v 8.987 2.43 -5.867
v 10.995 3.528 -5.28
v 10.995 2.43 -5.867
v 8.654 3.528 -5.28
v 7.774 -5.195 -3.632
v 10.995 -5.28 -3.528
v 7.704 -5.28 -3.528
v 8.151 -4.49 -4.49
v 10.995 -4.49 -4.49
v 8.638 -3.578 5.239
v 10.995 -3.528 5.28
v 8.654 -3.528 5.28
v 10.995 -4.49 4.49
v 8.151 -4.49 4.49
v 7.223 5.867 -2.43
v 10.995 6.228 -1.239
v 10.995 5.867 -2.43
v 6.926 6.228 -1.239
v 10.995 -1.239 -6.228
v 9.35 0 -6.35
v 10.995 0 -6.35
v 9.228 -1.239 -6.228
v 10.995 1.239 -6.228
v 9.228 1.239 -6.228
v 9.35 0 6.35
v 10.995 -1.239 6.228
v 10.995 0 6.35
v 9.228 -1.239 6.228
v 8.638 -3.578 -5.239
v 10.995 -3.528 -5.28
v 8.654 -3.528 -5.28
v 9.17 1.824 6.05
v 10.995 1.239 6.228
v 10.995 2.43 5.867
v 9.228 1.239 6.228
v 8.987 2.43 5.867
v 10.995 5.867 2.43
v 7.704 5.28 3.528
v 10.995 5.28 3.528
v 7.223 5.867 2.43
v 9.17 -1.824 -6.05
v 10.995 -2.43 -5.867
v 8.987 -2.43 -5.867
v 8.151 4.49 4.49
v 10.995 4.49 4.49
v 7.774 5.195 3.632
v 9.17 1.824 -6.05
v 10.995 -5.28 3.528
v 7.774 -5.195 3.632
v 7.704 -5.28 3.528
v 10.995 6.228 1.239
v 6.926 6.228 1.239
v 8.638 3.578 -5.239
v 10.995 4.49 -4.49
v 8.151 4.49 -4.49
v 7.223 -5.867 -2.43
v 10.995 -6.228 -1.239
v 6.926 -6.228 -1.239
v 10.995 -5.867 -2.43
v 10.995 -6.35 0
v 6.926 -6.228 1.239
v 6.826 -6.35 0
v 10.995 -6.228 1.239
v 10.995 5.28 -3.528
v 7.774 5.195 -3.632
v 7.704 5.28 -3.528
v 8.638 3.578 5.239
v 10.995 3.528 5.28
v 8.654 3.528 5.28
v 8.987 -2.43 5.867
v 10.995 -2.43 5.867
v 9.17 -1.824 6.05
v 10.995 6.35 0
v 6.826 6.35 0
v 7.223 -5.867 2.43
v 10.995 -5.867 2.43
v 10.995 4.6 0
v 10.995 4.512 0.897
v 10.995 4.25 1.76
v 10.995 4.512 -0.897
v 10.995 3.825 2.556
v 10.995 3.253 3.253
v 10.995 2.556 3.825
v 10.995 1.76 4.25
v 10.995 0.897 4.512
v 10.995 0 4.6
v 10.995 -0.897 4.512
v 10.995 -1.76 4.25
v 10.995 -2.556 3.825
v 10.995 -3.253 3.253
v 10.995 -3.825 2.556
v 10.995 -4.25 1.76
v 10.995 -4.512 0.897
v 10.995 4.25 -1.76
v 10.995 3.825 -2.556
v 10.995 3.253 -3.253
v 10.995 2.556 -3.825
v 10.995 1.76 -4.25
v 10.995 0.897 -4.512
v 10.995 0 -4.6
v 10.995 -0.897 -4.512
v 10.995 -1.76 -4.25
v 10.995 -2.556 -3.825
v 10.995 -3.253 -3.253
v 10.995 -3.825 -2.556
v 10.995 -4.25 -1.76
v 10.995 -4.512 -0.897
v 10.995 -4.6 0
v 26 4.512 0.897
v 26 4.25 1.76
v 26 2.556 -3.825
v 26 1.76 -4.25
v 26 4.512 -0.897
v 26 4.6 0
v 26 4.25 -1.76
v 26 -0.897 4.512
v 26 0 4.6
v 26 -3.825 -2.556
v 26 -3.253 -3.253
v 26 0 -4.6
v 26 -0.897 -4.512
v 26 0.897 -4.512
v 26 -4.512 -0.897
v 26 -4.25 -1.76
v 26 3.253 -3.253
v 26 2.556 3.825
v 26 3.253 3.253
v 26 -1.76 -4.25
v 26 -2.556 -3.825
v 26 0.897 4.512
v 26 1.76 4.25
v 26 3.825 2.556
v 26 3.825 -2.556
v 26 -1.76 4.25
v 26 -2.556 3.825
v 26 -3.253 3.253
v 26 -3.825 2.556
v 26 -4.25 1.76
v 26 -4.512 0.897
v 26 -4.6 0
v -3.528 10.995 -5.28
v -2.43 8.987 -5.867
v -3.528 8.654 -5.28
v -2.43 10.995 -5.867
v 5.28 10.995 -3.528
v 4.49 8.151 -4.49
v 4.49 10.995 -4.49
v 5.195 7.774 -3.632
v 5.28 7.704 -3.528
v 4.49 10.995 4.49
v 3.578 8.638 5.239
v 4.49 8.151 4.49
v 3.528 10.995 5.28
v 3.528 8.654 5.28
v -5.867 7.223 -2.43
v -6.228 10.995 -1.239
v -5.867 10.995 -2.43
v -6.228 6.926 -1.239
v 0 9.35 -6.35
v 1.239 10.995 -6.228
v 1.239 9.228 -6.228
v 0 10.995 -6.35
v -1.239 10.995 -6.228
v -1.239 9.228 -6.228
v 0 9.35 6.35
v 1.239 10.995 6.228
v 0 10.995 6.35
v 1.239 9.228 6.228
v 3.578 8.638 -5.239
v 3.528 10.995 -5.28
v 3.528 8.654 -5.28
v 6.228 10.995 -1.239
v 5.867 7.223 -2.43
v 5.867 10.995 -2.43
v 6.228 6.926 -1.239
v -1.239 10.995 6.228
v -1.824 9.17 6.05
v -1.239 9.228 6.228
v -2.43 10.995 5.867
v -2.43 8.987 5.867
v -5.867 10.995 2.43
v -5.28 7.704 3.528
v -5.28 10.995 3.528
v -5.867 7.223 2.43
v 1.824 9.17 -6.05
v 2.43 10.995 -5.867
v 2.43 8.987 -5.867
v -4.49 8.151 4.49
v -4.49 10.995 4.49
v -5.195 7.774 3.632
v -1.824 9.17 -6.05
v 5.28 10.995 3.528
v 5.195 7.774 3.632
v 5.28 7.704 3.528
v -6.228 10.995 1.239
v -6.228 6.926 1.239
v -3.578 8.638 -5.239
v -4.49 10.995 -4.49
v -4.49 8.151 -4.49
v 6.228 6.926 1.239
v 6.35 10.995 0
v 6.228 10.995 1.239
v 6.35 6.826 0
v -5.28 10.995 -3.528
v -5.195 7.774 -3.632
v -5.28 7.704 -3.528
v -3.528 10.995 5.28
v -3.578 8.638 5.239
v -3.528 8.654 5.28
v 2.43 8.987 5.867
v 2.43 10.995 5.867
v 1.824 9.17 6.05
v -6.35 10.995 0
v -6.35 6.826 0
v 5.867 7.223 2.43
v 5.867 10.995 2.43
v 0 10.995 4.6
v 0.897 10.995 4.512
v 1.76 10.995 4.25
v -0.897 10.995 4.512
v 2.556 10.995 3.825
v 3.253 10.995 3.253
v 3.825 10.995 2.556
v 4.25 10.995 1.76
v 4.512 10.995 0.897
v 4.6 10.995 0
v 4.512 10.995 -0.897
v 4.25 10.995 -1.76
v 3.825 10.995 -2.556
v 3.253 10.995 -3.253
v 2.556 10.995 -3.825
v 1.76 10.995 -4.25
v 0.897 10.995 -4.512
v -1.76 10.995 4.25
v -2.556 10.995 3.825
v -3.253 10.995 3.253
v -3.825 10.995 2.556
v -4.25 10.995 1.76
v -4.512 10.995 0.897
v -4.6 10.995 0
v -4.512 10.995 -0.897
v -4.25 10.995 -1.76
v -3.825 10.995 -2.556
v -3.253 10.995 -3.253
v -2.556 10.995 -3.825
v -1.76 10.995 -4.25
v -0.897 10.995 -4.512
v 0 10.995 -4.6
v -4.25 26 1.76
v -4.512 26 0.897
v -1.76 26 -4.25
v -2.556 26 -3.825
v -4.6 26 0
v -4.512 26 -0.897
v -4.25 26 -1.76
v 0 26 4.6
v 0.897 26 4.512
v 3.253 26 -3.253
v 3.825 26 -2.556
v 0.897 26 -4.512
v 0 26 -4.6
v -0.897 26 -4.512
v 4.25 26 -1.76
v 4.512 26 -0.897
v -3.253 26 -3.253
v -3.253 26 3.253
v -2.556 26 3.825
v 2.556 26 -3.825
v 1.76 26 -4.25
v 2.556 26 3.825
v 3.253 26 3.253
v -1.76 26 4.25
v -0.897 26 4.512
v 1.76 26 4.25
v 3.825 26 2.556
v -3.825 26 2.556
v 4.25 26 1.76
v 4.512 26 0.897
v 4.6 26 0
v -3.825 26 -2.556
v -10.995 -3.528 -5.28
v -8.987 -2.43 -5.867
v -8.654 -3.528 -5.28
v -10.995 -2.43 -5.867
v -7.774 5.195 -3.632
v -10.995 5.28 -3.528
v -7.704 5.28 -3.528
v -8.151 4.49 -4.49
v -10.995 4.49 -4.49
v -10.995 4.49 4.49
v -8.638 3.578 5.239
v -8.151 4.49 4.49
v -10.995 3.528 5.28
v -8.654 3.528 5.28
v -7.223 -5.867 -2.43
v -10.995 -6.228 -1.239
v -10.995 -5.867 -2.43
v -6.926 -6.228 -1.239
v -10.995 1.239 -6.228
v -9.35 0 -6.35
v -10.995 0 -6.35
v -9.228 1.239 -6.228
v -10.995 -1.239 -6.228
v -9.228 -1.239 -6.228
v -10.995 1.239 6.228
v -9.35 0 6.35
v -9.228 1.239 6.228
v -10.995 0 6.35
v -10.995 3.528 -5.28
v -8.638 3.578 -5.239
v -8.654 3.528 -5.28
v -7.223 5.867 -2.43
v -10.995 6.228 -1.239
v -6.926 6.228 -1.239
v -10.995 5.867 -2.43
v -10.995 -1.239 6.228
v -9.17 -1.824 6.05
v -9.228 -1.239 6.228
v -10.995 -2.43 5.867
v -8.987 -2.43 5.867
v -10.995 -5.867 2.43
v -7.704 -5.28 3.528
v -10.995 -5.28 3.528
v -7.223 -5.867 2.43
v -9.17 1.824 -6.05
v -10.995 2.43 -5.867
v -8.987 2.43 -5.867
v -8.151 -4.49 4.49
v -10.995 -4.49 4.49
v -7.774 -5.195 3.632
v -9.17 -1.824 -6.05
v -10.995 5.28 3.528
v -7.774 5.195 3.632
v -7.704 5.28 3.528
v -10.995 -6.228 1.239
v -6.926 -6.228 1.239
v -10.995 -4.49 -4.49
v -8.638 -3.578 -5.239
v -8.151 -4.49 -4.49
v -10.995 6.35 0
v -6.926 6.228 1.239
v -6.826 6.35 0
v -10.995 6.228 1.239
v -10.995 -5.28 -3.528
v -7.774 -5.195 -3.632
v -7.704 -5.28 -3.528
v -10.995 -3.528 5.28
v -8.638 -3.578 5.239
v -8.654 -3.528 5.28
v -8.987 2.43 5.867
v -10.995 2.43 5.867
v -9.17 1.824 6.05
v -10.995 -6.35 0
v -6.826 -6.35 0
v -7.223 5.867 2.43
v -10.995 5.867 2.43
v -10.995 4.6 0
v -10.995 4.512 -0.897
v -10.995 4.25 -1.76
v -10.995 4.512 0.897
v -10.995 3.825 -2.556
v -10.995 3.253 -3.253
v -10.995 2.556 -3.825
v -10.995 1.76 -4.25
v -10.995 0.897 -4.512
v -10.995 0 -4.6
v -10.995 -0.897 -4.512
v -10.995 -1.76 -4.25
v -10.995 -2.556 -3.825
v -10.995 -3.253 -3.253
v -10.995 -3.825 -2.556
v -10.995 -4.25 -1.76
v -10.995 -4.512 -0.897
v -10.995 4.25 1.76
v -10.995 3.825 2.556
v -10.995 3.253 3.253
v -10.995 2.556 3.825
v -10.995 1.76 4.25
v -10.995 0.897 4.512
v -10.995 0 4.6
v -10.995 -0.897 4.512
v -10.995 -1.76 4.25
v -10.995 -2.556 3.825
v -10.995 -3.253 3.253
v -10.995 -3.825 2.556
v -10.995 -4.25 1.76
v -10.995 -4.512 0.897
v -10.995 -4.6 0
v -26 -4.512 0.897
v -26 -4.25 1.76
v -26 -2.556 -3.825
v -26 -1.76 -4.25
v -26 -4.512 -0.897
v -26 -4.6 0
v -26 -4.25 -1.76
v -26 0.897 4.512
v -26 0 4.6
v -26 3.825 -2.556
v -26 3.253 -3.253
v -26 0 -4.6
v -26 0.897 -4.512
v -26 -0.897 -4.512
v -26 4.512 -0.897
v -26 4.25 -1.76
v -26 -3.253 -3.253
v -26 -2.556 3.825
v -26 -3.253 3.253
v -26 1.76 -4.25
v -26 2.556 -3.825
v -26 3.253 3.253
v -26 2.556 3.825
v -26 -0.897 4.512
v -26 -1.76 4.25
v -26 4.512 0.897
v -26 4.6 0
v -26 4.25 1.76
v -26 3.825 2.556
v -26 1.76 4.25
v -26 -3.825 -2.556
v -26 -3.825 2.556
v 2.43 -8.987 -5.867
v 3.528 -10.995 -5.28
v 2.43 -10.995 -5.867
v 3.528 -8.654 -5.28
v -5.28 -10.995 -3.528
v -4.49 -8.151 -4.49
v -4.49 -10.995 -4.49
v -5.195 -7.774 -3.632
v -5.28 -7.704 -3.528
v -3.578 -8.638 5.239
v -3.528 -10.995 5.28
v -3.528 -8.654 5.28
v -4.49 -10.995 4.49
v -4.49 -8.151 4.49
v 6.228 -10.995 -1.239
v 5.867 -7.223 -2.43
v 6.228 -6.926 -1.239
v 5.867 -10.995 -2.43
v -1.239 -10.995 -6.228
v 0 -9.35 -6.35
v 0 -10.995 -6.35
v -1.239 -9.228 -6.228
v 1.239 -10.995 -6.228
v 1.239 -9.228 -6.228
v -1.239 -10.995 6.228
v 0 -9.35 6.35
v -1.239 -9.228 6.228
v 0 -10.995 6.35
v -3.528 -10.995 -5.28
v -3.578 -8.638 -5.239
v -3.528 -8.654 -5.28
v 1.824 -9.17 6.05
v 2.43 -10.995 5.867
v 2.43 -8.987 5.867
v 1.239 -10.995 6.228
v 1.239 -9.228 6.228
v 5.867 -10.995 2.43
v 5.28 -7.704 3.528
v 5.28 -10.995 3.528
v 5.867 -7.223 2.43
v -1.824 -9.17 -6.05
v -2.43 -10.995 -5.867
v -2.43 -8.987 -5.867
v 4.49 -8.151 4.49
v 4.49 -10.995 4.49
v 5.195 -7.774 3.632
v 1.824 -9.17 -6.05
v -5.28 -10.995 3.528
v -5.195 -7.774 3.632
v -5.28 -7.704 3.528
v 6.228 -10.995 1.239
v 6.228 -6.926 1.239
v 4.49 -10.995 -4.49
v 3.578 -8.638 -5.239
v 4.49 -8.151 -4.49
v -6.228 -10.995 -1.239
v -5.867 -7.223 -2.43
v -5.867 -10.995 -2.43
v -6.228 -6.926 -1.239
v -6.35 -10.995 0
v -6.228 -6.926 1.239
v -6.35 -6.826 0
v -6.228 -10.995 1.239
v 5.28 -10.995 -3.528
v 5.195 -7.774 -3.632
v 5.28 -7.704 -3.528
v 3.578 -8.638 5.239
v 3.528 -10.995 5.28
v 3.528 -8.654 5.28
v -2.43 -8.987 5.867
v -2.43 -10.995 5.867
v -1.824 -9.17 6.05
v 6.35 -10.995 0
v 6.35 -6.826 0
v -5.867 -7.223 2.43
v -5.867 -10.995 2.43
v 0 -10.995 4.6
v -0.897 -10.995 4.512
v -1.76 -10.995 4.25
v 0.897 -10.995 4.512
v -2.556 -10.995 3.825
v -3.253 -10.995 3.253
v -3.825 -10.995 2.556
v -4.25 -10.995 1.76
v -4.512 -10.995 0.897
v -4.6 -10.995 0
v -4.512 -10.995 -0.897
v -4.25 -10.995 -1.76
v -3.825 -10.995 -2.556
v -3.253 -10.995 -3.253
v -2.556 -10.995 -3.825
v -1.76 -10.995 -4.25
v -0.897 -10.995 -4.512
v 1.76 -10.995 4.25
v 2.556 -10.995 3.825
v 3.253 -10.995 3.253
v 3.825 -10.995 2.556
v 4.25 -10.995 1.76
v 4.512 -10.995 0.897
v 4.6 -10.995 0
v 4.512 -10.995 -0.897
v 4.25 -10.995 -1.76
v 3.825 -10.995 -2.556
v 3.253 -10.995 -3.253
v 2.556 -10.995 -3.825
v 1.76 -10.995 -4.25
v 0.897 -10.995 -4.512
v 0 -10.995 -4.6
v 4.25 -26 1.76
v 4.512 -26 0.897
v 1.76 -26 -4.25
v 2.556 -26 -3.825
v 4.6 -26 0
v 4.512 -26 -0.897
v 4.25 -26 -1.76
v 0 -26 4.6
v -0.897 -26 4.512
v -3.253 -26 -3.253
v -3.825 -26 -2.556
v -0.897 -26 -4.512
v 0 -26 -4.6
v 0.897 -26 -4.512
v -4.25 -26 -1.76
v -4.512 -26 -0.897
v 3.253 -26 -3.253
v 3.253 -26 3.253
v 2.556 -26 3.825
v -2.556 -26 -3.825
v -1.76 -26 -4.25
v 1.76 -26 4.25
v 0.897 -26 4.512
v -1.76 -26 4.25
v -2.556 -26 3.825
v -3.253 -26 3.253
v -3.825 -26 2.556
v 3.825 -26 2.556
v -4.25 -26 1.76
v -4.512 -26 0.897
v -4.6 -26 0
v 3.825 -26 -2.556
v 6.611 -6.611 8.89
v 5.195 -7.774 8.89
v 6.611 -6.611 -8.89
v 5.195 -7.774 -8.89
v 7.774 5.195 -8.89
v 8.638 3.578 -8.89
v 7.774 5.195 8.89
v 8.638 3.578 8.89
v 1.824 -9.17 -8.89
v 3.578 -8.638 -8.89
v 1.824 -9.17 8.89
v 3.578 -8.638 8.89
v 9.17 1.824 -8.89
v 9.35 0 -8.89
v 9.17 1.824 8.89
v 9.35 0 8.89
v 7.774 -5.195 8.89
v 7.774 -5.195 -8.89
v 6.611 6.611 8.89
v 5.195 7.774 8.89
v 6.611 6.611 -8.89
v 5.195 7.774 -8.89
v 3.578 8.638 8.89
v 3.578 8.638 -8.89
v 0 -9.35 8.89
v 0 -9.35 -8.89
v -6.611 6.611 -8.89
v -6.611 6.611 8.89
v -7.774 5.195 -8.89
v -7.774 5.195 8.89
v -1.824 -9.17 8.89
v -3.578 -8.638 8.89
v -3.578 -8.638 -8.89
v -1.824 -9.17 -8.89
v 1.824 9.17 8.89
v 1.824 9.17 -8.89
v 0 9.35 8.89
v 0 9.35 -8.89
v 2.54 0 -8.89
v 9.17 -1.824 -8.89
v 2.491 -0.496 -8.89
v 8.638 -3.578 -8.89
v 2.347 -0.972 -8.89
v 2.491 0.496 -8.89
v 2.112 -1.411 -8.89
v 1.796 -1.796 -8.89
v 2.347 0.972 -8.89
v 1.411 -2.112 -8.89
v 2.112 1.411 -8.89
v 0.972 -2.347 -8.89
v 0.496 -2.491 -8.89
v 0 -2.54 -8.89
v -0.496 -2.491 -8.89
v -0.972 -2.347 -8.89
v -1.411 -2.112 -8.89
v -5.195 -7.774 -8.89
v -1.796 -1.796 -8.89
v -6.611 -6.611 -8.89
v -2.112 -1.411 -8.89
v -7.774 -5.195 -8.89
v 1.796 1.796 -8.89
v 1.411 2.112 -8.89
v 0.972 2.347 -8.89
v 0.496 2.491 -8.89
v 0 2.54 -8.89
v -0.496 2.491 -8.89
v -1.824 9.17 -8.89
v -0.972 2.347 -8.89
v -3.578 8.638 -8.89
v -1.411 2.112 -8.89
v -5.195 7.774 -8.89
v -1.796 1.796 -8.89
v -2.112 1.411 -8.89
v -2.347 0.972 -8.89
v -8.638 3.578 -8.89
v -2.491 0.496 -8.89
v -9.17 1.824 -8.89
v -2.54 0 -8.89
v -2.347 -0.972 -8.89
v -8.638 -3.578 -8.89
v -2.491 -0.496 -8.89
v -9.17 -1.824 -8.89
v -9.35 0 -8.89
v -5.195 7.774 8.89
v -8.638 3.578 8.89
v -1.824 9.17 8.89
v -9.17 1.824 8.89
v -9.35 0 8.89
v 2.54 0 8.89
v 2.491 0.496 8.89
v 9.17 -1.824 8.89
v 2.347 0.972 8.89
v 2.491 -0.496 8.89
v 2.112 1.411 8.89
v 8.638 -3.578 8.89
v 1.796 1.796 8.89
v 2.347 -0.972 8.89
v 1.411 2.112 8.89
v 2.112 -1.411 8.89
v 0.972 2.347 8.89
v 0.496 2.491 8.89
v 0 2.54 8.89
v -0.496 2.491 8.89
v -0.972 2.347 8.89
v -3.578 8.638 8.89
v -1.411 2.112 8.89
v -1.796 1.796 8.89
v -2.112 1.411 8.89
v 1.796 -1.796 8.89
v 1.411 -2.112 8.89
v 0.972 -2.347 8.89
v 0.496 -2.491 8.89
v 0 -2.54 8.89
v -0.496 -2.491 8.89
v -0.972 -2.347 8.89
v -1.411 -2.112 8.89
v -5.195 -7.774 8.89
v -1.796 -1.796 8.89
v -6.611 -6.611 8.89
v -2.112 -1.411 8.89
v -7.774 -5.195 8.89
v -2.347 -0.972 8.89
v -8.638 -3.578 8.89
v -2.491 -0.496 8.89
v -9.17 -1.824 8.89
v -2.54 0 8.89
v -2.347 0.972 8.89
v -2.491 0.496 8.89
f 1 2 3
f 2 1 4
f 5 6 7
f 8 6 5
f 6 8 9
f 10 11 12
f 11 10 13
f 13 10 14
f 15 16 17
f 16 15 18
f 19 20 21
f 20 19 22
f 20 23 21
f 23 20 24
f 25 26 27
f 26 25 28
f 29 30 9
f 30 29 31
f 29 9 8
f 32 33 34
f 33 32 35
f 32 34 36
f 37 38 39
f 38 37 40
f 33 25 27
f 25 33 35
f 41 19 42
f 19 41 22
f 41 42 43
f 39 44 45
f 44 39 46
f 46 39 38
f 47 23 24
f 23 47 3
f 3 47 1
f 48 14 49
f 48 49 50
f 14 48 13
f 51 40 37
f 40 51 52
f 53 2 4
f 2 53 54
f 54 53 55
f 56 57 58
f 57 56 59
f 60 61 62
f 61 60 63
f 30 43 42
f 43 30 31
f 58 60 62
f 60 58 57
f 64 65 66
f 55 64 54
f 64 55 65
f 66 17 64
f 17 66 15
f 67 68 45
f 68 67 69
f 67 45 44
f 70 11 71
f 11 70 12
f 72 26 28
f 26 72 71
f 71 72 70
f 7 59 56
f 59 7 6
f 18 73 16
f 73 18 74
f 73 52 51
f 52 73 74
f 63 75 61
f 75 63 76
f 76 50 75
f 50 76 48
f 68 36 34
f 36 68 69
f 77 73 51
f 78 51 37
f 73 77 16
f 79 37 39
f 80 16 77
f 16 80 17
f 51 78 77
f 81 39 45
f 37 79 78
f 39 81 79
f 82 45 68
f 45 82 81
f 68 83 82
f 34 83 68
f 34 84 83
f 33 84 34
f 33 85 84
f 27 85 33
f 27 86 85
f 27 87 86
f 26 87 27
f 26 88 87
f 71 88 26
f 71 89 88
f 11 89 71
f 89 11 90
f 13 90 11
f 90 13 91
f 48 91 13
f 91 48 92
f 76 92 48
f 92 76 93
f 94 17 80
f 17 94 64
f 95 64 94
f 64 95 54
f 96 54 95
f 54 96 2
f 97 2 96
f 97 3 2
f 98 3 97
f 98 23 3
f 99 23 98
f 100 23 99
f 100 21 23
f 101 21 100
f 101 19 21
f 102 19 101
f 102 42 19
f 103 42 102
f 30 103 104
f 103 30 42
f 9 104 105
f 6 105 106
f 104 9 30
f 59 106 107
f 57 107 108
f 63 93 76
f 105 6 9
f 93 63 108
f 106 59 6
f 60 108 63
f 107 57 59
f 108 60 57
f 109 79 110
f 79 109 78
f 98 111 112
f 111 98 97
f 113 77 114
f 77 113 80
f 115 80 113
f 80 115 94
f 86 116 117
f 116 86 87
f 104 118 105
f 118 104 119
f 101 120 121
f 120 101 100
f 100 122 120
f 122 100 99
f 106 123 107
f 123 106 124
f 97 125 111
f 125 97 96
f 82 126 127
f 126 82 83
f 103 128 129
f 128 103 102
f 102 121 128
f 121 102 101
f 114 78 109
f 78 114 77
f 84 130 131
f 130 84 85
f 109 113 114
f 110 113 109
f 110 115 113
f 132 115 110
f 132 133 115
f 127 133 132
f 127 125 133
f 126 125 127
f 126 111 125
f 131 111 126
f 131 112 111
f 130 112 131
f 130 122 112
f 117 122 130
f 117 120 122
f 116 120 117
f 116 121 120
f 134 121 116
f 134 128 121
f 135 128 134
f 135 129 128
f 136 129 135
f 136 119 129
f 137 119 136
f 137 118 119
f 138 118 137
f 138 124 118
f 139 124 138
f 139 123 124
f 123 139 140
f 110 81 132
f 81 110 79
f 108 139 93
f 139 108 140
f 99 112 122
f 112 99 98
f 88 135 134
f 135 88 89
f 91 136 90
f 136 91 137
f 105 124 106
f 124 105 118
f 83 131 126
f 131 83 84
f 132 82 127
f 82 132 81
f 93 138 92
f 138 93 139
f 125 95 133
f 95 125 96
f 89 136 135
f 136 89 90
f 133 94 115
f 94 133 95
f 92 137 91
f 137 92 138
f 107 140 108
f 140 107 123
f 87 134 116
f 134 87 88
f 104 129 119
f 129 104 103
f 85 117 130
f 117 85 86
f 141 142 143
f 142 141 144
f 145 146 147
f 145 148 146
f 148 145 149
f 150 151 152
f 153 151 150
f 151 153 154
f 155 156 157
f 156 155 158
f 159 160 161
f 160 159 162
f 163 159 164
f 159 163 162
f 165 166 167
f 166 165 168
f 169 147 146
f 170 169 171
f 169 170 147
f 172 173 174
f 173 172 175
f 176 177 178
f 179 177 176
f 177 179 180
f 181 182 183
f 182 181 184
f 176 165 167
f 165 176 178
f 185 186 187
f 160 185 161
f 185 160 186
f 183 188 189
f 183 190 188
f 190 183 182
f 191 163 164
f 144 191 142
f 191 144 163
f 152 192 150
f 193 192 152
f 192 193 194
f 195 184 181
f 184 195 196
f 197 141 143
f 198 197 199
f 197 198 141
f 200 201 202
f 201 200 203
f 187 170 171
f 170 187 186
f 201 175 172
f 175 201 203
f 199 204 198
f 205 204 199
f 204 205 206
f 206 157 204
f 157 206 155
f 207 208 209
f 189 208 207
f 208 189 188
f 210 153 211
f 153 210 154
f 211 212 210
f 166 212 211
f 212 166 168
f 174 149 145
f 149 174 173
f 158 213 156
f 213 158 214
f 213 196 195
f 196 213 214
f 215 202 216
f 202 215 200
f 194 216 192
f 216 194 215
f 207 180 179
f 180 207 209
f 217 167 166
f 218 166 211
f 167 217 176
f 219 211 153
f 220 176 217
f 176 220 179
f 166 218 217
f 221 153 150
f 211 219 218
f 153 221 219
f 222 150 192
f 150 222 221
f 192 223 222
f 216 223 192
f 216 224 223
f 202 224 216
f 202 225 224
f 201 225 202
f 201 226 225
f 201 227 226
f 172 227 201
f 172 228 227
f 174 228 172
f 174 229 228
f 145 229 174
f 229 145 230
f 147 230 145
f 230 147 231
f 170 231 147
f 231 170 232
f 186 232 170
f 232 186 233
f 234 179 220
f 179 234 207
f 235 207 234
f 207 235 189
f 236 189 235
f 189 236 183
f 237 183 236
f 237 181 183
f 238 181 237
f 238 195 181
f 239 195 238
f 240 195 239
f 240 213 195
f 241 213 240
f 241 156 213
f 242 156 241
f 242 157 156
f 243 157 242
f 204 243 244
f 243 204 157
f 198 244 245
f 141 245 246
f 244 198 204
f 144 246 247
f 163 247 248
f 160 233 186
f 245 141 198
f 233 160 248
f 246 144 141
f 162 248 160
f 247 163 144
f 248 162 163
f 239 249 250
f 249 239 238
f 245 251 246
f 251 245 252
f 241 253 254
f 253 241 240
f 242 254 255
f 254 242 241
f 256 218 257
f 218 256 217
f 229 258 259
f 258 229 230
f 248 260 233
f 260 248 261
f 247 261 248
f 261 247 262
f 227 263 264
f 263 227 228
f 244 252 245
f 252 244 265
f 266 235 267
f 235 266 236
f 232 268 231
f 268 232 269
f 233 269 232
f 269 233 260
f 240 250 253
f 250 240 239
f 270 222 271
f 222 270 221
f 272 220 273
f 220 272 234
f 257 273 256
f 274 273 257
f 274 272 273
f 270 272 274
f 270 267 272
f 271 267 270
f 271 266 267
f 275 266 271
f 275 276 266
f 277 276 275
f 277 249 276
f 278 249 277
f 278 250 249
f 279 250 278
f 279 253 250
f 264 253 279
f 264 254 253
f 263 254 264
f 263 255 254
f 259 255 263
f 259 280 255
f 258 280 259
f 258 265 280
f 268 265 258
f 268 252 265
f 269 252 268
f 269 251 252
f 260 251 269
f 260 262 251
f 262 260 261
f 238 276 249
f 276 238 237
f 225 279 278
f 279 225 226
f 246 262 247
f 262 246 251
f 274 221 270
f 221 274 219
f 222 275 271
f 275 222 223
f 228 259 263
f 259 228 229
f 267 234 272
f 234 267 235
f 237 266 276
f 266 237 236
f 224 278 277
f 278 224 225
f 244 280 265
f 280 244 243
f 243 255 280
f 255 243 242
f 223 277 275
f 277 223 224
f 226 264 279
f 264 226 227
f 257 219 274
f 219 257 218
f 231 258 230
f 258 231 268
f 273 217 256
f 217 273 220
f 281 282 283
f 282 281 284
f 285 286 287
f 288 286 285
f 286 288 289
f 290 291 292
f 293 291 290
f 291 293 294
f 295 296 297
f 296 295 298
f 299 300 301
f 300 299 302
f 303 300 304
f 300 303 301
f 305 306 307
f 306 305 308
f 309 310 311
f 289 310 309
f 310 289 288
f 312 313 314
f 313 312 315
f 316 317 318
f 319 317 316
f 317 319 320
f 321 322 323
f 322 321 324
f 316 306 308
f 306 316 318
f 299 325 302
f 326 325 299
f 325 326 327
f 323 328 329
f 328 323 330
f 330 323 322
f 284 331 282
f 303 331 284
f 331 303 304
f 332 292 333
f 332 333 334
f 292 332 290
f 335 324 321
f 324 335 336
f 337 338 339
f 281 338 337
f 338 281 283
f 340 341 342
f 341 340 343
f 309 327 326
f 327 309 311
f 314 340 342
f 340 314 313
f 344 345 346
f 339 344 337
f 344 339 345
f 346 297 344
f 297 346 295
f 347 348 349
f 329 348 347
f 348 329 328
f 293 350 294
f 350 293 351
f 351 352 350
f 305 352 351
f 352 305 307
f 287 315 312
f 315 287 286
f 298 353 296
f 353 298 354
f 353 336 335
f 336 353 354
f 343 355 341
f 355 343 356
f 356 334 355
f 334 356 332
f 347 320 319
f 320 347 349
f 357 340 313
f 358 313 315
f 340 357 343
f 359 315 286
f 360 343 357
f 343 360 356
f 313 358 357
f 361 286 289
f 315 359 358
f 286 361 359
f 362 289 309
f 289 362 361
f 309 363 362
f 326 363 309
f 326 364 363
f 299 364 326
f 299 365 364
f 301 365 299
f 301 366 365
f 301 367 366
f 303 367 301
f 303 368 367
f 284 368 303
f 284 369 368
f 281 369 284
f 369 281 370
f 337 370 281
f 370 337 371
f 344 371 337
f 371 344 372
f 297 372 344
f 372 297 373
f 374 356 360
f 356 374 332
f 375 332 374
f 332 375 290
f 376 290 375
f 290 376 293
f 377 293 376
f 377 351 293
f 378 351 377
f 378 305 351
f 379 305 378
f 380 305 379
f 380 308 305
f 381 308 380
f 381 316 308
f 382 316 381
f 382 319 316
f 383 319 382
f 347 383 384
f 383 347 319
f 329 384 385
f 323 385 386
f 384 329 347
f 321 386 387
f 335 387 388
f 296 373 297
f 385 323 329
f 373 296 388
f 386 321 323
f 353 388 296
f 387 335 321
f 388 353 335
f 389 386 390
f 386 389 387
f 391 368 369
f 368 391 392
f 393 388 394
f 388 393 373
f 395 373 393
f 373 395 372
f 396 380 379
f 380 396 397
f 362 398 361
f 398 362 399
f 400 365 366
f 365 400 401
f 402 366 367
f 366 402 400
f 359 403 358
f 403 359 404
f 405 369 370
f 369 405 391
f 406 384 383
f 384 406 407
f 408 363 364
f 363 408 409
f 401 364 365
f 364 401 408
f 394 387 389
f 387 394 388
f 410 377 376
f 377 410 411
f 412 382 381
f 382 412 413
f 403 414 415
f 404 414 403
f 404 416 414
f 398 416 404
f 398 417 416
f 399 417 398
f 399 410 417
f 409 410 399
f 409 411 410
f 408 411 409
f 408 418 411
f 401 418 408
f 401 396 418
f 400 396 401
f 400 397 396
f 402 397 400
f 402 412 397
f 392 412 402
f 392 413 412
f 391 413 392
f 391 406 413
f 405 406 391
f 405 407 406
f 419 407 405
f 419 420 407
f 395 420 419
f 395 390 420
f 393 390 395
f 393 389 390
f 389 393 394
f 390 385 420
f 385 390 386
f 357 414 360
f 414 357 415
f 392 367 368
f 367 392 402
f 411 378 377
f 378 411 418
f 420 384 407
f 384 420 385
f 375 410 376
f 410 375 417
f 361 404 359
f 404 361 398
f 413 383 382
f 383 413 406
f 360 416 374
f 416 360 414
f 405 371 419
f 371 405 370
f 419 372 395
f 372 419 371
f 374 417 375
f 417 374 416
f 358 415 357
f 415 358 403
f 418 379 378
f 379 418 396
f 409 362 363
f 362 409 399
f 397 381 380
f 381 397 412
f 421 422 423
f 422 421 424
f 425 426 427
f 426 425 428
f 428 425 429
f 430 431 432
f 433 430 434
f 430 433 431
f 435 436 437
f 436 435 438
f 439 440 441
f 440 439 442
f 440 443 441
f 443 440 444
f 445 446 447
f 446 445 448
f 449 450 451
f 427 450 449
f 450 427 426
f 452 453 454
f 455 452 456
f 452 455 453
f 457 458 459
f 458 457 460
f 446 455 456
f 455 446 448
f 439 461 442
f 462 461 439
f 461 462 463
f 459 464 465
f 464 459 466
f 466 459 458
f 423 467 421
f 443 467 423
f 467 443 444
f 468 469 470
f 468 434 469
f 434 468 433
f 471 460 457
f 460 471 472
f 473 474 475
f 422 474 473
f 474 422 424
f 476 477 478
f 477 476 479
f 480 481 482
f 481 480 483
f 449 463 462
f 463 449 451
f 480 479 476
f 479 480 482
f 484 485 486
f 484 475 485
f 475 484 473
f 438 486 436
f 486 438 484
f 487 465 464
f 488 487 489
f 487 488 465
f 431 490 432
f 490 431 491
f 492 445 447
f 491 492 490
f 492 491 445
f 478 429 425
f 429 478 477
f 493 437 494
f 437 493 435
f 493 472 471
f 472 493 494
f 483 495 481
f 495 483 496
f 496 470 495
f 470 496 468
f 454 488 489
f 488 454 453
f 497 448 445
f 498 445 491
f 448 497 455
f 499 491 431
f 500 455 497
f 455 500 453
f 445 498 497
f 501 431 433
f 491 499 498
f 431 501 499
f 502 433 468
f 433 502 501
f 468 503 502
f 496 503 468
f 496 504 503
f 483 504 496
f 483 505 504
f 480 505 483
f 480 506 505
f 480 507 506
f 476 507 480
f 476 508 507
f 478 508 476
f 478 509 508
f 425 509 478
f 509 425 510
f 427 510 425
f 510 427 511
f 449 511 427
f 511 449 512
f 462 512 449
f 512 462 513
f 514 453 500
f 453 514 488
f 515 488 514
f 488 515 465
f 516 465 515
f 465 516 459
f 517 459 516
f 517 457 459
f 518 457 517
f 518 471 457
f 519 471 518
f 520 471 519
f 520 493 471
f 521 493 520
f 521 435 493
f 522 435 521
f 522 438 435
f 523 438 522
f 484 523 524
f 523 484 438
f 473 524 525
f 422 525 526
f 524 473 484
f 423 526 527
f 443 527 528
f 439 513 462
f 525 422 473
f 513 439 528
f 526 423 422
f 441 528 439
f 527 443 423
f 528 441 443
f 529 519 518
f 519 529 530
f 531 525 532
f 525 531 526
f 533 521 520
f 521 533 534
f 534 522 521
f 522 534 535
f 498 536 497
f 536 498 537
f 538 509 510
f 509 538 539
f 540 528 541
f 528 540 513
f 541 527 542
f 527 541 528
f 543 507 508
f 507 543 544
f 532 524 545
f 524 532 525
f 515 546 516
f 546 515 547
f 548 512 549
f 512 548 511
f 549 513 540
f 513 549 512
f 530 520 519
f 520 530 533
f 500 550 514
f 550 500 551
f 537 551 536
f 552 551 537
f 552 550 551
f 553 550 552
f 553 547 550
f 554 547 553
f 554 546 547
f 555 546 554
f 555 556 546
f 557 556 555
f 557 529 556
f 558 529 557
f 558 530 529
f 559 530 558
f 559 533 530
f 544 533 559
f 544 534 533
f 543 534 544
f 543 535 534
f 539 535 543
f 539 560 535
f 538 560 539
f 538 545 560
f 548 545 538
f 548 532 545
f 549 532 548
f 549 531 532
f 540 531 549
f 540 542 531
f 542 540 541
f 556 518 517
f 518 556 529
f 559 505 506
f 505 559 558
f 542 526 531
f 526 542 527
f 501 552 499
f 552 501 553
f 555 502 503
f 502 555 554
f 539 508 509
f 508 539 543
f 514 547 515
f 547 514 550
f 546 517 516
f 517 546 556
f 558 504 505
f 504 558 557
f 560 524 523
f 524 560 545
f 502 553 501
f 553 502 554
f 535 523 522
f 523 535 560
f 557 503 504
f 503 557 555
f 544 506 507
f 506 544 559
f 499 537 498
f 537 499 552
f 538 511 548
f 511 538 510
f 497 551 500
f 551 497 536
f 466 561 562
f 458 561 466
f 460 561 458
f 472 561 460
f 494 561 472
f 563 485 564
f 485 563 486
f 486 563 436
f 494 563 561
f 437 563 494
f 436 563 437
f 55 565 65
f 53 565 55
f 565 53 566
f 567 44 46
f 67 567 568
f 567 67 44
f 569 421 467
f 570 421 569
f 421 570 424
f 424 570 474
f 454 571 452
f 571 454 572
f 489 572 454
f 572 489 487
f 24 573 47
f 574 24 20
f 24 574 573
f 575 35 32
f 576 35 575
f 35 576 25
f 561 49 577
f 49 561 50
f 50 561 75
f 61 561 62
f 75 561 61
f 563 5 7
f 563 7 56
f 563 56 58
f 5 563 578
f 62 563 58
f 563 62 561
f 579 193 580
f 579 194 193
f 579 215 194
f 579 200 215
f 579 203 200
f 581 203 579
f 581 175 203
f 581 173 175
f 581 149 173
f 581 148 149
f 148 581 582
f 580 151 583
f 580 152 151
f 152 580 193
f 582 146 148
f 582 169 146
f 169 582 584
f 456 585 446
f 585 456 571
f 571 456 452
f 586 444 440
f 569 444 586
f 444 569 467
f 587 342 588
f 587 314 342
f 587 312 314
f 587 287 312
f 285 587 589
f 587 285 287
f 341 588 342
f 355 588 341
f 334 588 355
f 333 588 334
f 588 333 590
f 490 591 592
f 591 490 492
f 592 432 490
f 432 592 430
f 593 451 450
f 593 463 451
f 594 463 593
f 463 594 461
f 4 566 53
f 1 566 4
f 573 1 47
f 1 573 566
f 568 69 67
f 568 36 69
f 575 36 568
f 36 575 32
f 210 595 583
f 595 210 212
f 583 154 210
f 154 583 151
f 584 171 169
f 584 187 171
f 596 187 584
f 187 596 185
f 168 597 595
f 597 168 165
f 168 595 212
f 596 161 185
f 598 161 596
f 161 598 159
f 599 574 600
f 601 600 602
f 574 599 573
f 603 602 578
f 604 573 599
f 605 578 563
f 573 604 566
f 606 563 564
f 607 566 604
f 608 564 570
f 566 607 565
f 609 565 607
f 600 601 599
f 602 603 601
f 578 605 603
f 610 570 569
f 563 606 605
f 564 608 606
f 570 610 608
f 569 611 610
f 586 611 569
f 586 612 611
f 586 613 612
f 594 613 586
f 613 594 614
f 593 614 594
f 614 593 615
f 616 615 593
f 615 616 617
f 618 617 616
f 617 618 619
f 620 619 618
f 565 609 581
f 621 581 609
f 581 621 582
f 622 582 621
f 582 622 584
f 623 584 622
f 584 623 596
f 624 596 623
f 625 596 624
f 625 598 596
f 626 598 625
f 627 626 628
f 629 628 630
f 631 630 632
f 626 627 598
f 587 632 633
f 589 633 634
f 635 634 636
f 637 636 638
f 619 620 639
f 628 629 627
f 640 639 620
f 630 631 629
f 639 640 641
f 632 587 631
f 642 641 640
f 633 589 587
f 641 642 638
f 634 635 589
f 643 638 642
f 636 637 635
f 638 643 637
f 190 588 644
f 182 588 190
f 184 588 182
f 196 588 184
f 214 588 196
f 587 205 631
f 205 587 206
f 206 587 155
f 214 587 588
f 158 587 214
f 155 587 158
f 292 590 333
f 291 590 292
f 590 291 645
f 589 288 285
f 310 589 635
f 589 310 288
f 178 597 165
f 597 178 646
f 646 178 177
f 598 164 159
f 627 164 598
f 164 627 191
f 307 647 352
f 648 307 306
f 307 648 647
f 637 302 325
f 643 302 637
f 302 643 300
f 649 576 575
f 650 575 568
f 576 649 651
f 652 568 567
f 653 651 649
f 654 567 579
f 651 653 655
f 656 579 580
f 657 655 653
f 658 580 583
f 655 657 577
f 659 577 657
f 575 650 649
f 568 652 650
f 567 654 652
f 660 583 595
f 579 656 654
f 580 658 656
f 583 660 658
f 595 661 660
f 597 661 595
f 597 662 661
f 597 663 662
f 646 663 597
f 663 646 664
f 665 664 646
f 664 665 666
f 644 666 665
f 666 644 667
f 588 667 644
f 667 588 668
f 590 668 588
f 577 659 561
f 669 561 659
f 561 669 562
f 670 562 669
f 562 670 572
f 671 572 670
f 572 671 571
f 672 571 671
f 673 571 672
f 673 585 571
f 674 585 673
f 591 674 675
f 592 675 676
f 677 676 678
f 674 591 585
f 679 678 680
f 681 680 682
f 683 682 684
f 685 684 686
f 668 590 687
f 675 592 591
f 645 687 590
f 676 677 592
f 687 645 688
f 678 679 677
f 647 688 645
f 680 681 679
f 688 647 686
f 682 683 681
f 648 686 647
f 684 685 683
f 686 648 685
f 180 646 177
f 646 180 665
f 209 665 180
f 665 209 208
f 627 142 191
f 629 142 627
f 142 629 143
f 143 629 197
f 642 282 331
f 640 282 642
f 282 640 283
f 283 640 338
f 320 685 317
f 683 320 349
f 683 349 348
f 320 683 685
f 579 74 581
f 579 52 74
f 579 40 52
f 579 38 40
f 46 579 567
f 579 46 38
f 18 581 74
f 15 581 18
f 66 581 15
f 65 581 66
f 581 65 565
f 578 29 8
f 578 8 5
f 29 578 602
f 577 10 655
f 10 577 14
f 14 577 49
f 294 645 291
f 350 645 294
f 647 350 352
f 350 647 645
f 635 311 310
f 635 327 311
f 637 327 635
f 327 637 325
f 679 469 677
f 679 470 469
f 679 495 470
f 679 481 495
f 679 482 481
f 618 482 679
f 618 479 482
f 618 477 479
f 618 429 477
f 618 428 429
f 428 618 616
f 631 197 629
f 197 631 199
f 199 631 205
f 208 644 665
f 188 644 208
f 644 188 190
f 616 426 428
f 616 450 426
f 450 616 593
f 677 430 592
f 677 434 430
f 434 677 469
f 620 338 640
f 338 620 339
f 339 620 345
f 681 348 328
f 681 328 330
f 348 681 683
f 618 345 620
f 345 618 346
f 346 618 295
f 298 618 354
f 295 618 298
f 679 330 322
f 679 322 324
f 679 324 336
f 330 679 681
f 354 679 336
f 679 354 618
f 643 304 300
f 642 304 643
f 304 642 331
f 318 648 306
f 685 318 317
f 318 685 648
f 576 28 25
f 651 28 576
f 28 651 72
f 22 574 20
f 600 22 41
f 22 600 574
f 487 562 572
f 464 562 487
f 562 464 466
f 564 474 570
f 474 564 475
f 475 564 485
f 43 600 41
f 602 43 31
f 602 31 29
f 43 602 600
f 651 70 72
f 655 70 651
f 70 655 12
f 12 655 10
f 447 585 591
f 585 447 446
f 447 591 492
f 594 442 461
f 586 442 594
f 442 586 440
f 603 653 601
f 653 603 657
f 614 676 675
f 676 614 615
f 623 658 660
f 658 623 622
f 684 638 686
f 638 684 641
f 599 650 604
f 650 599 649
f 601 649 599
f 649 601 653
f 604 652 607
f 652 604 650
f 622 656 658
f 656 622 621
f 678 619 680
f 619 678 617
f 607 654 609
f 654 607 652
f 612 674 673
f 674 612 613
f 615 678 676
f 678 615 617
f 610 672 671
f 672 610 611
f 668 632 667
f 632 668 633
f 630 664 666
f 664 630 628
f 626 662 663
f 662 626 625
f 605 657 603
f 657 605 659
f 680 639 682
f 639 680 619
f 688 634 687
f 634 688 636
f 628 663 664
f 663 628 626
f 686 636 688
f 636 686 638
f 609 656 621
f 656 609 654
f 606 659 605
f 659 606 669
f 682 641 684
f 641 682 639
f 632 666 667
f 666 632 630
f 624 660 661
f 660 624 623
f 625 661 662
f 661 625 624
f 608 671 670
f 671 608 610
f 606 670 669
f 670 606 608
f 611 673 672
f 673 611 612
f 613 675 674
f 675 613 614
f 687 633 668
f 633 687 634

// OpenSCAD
$fn = 32;

// ----------------------------------------------------------------------
// Cardan cross: 52 mm span, 12.7 mm trunnions
// ----------------------------------------------------------------------

// --- parameters (mm) ---
journal_d = 12.7;         // trunnion diameter
arm_len = 26;             // trunnion length from the centre
step_r = 4.32;            // step position from the centre
step_d = 9.2;             // journal diameter after the step
hub_d = 18.7;             // hub diameter
hub_h = 17.78;            // hub height
bore_d = 5.08;            // hub bore

difference() {
  union() {
    /* hub along the joint axis */
    cylinder(h = hub_h, d = hub_d, center = true);
    for (a = [0 : 90 : 270]) rotate([0, 0, a]) {
      /* trunnion, sunk into the hub */
      translate([hub_d / 4, 0, 0]) rotate([0, 90, 0]) cylinder(h = step_r + 2, d = journal_d);
      /* stepped journal out to the tip */
      translate([step_r - 0.5, 0, 0]) rotate([0, 90, 0]) cylinder(h = arm_len + 0.5 - step_r, d = step_d);
    }
  }
  /* lubrication bore through the hub, 2.5 mm clear on both sides */
  translate([0, 0, -hub_h / 2 - 2.5]) cylinder(h = hub_h + 5, d = bore_d);
}
